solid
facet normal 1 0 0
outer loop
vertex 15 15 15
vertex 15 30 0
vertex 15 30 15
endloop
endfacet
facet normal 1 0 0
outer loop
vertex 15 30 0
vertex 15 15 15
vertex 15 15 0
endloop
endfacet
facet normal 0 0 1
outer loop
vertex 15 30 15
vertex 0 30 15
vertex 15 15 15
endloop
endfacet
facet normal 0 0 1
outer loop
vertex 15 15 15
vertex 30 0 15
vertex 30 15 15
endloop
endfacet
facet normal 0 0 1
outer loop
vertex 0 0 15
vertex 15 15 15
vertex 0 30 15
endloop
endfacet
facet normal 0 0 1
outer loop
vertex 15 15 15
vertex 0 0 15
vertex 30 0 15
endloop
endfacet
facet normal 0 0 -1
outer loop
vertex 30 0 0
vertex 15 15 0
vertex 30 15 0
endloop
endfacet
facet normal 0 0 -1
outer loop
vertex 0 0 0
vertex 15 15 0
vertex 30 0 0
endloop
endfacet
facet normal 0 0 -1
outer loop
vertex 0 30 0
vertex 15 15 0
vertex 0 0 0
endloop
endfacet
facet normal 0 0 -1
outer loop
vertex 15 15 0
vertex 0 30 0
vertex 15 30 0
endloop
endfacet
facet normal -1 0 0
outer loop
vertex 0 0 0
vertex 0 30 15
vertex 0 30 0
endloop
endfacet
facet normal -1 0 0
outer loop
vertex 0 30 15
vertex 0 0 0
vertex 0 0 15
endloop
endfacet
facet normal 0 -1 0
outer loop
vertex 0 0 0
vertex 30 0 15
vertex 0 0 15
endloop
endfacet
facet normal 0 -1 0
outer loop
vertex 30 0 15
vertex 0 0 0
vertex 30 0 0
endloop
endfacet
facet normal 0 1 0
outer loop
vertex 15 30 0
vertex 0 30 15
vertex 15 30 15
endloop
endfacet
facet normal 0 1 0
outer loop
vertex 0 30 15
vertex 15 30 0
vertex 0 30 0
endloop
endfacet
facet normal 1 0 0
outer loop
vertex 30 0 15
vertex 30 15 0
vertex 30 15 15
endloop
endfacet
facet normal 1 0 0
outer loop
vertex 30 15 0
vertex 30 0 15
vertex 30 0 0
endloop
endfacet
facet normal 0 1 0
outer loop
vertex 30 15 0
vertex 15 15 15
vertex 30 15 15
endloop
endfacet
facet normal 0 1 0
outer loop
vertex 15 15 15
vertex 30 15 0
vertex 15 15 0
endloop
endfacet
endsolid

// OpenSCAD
// Fongo piece 8: Corner. GPL-3.0; see README.txt.
// All cube positions derive from the canonical catalogue. z points up.
unit = 15; // mm, scale all pieces AND cards together
positions = [[0,0,0],[0,1,0],[1,0,0]];
union() { for (p = positions) translate(p * unit) cube([unit, unit, unit]); }
